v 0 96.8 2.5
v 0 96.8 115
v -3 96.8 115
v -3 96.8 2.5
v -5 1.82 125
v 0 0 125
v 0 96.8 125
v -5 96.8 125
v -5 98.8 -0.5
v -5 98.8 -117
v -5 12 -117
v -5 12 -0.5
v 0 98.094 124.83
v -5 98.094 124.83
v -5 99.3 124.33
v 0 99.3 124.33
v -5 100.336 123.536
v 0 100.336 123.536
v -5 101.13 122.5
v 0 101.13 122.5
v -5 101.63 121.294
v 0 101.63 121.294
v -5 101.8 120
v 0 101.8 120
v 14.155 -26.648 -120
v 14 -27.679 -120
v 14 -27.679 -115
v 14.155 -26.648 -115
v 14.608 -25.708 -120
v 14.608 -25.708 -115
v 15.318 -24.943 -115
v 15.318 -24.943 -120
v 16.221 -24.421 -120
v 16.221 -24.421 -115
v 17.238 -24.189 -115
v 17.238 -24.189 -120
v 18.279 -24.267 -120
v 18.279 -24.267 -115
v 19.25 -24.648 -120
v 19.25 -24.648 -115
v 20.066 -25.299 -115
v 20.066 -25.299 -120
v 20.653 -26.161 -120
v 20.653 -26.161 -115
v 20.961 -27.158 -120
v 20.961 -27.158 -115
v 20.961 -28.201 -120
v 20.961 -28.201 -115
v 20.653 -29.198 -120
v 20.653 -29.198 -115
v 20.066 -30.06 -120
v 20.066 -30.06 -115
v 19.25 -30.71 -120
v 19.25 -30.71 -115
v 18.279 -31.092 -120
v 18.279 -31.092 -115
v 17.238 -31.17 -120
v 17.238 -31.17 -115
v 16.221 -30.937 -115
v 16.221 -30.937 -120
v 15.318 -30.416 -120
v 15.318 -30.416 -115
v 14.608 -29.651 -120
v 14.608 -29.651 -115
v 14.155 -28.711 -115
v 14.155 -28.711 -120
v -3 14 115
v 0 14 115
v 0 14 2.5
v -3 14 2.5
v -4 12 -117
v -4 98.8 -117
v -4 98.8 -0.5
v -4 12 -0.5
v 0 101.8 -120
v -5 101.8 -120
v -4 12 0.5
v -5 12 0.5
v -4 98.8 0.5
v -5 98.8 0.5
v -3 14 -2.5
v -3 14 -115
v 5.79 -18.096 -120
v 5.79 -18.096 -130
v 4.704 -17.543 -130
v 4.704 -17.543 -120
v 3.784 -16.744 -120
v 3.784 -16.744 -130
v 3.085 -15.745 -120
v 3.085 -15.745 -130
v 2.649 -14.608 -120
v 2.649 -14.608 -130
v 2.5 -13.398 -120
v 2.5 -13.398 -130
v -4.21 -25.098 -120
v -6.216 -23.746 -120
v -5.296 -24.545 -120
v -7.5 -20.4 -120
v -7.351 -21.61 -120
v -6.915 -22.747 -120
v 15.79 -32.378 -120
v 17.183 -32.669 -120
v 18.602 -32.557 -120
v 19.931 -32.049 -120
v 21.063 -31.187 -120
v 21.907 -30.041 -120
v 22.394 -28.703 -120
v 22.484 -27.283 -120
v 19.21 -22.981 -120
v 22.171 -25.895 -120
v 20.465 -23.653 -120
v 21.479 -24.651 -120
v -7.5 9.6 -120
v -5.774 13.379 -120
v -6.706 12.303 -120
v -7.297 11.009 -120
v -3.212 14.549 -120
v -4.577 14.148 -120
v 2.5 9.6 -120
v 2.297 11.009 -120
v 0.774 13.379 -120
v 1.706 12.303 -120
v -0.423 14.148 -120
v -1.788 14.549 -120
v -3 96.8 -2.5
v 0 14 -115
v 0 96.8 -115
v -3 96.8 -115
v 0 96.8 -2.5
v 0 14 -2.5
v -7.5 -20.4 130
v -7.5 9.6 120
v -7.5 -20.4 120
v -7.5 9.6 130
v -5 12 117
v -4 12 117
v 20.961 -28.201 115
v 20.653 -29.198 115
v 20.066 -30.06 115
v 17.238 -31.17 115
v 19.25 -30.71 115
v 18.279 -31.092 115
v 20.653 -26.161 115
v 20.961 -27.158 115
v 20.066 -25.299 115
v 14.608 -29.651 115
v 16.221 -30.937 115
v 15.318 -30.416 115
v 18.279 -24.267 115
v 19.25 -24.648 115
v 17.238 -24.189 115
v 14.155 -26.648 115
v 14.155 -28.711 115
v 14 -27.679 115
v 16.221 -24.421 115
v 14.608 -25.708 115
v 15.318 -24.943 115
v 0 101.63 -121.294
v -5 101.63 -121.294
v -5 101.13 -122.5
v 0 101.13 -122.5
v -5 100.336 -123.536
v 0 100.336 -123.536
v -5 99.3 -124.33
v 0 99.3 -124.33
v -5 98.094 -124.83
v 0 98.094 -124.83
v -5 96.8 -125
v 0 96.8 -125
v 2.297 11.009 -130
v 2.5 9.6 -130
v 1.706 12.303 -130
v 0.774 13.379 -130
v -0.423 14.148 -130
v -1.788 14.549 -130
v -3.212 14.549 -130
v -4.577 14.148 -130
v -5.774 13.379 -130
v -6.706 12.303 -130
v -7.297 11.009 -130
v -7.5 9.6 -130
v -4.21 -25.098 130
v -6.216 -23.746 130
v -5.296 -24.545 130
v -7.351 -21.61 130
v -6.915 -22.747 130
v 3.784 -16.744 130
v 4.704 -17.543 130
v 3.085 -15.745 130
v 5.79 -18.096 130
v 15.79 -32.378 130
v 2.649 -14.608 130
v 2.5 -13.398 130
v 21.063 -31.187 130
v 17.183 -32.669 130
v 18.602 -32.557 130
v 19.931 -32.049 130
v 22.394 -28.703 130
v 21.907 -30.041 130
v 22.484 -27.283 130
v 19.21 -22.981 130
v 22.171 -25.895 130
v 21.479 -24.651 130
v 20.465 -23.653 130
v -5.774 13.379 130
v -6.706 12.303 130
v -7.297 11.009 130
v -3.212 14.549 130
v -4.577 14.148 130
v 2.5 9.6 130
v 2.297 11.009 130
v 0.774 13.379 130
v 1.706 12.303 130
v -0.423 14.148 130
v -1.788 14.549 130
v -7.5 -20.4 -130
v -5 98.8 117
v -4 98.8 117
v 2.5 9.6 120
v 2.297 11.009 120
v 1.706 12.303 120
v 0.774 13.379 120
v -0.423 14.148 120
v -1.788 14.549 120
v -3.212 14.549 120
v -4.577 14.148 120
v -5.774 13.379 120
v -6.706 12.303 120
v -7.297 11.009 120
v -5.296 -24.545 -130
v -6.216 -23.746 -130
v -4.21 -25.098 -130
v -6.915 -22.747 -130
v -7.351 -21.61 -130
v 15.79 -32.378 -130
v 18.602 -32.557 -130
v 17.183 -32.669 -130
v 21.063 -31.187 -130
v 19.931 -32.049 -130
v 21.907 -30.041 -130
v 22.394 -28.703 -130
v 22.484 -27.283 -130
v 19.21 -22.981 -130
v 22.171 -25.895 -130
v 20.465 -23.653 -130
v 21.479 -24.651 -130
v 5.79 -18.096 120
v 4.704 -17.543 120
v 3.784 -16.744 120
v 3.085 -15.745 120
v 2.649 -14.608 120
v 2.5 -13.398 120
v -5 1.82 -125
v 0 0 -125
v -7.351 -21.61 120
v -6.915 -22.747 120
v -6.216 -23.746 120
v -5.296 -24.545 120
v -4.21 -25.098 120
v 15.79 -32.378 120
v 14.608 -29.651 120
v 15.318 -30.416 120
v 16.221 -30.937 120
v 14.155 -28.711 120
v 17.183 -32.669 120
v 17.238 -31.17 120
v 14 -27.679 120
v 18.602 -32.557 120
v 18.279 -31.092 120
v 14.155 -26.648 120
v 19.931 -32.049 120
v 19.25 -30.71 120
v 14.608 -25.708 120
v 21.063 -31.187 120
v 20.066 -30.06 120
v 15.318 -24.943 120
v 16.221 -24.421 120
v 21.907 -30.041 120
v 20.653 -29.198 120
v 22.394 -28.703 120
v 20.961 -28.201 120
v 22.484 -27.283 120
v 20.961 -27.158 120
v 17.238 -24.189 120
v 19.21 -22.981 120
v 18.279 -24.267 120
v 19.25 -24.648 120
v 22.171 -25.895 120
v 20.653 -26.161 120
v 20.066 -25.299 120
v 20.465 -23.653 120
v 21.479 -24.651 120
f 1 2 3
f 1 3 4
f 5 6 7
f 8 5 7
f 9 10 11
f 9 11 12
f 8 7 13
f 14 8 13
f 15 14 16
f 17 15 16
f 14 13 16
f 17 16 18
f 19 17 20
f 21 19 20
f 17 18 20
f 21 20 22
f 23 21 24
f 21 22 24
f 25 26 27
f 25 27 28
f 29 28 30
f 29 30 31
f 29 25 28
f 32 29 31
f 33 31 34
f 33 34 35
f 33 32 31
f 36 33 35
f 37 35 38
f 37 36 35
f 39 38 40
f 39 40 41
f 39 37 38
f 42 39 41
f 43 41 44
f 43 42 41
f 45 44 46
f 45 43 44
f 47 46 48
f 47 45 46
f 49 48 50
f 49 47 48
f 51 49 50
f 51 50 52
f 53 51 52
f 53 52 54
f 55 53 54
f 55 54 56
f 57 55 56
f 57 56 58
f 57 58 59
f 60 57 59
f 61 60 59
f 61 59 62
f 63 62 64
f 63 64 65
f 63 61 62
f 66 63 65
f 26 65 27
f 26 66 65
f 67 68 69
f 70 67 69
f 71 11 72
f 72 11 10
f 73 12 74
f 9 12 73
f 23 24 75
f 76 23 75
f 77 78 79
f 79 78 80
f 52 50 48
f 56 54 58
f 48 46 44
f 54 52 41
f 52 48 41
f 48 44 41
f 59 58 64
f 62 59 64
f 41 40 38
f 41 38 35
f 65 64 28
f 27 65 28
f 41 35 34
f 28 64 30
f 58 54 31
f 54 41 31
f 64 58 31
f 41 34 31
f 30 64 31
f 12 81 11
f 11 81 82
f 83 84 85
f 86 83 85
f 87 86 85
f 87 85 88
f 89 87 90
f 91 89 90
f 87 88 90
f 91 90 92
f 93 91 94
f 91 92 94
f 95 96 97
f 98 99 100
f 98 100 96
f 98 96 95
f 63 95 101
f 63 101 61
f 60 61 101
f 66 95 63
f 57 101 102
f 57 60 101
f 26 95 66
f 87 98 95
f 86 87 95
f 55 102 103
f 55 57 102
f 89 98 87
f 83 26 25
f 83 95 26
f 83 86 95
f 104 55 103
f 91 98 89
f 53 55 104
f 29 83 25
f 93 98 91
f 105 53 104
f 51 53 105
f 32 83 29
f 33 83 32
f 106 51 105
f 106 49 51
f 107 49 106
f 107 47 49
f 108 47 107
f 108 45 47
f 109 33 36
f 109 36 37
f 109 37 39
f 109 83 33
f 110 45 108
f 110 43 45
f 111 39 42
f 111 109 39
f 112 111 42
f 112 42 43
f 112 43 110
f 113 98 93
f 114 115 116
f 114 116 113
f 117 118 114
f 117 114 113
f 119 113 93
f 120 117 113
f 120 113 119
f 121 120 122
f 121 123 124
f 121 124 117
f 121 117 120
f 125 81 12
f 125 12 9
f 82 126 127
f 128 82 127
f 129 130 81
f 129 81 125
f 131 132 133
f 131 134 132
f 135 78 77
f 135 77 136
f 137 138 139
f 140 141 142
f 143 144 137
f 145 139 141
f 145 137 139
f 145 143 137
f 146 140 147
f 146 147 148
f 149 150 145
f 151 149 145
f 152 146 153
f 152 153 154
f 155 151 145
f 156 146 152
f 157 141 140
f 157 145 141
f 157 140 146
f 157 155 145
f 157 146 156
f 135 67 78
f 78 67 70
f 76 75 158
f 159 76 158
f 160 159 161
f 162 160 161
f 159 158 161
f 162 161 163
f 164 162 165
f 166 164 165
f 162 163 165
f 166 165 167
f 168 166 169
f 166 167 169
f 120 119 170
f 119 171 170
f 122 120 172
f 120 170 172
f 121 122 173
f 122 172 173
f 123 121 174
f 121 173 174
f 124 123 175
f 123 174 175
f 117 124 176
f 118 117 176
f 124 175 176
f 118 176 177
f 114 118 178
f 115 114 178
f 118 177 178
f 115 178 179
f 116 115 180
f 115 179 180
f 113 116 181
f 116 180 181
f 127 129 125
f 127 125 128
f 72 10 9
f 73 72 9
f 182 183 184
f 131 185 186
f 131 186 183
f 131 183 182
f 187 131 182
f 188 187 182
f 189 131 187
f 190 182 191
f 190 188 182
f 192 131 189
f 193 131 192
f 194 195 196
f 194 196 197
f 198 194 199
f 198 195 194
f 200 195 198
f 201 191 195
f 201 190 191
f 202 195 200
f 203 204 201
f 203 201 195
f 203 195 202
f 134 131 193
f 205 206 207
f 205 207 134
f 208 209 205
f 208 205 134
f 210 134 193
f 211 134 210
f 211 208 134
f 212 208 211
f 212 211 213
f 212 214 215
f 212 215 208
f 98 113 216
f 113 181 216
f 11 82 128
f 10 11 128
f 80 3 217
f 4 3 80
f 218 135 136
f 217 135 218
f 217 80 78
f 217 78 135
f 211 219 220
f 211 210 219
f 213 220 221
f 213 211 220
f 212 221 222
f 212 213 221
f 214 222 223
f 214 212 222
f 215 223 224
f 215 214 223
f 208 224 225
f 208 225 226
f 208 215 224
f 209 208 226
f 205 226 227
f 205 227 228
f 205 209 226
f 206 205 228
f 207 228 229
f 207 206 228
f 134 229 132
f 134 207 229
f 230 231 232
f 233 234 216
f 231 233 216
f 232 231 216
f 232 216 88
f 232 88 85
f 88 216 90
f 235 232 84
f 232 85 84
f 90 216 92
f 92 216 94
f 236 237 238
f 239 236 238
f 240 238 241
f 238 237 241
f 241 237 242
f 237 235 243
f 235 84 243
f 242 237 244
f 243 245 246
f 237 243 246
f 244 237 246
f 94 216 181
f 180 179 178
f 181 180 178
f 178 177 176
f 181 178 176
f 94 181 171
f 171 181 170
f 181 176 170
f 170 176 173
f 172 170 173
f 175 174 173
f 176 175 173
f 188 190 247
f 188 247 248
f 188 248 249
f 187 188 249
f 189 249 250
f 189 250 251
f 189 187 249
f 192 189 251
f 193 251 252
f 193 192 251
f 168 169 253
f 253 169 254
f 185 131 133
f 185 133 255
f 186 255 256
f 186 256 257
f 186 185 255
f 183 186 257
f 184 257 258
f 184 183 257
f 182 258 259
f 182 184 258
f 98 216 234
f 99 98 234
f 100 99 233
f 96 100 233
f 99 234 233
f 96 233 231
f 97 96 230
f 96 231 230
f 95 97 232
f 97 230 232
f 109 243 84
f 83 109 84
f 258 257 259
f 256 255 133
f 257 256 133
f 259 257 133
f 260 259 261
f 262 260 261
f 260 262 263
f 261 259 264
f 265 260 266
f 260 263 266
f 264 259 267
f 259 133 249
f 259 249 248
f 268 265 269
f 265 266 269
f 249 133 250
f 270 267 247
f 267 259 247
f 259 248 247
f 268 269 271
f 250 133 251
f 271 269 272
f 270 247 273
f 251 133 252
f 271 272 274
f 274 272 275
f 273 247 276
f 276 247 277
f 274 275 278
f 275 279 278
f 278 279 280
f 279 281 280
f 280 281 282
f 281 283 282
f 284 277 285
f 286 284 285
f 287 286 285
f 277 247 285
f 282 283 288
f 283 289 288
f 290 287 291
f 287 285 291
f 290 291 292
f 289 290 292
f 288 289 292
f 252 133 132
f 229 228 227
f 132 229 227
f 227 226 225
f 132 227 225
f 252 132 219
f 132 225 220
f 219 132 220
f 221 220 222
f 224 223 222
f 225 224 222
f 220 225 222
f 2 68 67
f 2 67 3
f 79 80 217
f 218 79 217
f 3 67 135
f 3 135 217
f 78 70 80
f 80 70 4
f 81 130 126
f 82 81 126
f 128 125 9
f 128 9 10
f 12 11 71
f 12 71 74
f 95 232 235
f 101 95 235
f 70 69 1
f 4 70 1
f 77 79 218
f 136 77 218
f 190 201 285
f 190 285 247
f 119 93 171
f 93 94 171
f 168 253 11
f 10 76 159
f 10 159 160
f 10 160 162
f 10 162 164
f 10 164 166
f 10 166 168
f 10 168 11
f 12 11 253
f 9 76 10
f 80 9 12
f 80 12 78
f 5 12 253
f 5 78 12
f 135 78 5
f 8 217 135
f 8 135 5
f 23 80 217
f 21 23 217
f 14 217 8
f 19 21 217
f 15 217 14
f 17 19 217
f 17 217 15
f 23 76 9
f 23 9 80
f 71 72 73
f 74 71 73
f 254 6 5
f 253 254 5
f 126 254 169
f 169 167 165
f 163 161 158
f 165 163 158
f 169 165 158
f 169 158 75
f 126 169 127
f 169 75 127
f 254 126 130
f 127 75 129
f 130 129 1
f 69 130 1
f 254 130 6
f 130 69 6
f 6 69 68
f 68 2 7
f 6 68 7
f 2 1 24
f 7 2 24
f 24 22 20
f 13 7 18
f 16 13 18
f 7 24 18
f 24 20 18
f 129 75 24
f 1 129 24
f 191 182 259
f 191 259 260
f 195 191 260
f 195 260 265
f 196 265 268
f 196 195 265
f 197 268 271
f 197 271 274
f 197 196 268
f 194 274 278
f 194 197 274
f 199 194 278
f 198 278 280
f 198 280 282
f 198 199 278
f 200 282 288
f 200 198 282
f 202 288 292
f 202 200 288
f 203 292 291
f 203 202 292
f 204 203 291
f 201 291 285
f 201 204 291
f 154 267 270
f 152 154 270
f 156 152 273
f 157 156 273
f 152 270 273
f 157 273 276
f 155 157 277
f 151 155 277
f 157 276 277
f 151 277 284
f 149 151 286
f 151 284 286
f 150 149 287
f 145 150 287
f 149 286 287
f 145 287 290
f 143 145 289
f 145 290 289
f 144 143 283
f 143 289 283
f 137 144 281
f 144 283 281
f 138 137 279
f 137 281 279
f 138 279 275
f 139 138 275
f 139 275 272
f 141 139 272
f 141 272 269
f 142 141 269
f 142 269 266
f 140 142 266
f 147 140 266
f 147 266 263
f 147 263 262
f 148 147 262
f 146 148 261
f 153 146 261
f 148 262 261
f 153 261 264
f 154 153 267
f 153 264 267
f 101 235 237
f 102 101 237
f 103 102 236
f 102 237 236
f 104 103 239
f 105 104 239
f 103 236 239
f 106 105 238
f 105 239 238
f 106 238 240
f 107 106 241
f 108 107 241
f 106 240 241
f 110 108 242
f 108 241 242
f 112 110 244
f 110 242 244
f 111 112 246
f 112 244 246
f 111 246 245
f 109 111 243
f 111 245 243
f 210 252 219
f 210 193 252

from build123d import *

# Parameters (mm, degrees)
SKETCH1_W             = 112.5
SKETCH1_H             = 82.8
BOSS_EXTRUDE1_DEPTH   = 5
CUT_EXTRUDE1_DEPTH    = 270.978221344
BOSS_EXTRUDE2_DEPTH   = 5
SKETCH4_R             = 3.5
BOSS_EXTRUDE3_DEPTH   = 5
CHAMFER3_SIZE         = 2
SKETCH6_W             = 116.5
SKETCH6_H             = 86.8
BOSS_EXTRUDE4_DEPTH   = 1
BOSS_EXTRUDE4_2_DEPTH = 1


with BuildPart() as part:
    # Sketch1 → Boss-Extrude1 (new body)
    with BuildSketch(Plane(origin=(0, 0, 0), x_dir=(0, 0, -1), z_dir=(1, 0, 0))):
        with BuildLine():
            Line((-120, 101.8), (120, 101.8))
            ThreePointArc((120, 101.8), (123.535533906, 100.335533906), (125, 96.8))
            Line((125, 96.8), (125, 0))
            Line((125, 0), (-125, 0))
            Line((-125, 0), (-125, 96.8))
            ThreePointArc((-125, 96.8), (-123.535533906, 100.335533906), (-120, 101.8))
        make_face()
        with Locations((58.75, 55.4)):
            Rectangle(SKETCH1_W, SKETCH1_H, mode=Mode.SUBTRACT)
        with Locations((-58.75, 55.4)):
            Rectangle(SKETCH1_W, SKETCH1_H, mode=Mode.SUBTRACT)
    extrude(amount=-BOSS_EXTRUDE1_DEPTH)

    # Sketch2 → Cut-Extrude1 (cut, through all)
    with BuildSketch(Plane.XY.offset(125)):
        Polygon((-5, 0), (0, 0), (-5, 1.819851171), align=None)
    extrude(amount=-CUT_EXTRUDE1_DEPTH, mode=Mode.SUBTRACT)

    # Chamfer3
    chamfer3_edges = [part.edges().sort_by_distance(p)[0] for p in [
        (-5, 55.4, 115),
        (-5, 96.8, 58.75),
        (-5, 55.4, 2.5),
        (-5, 14, 58.75),
        (-5, 55.4, -115),
        (-5, 14, -58.75),
        (-5, 55.4, -2.5),
        (-5, 96.8, -58.75),
    ]]
    chamfer(chamfer3_edges, length=CHAMFER3_SIZE)


with BuildPart() as body_2:
    # Sketch3 → Boss-Extrude2 (new, symmetric)
    with BuildSketch(Plane.XY.offset(125)):
        with BuildLine():
            Line((-7.5, 9.6), (-7.5, -20.4))
            ThreePointArc((-7.5, -20.4), (-6.595760221, -23.267882182), (-4.210100717, -25.098463104))
            Line((-4.210100717, -25.098463104), (15.789899283, -32.377867789))
            ThreePointArc((15.789899283, -32.377867789), (22.198463104, -29.389505402), (19.210100717, -22.980941581))
            Line((19.210100717, -22.980941581), (5.789899283, -18.096387722))
            ThreePointArc((5.789899283, -18.096387722), (3.404239779, -16.2658068), (2.5, -13.397924618))
            Line((2.5, -13.397924618), (2.5, 9.6))
            ThreePointArc((2.5, 9.6), (-2.5, 14.6), (-7.5, 9.6))
        make_face()
    extrude(amount=BOSS_EXTRUDE2_DEPTH, both=True)

    # Sketch4 → Boss-Extrude3 (add)
    with BuildSketch(Plane(origin=(0, 0, 120), x_dir=(-1, 0, 0), z_dir=(0, 0, -1))):
        with Locations((-17.5, -27.679404685)):
            Circle(SKETCH4_R)
    extrude(amount=BOSS_EXTRUDE3_DEPTH)


with BuildPart() as body_3:
    # Mirror1: mirrored copy
    add(body_2.part.mirror(Plane.XY))


with BuildPart() as body_4:
    # Sketch6 → Boss-Extrude4 (new body)
    with BuildSketch(Plane.ZY.offset(5)):
        with Locations((58.75, 55.4)):
            Rectangle(SKETCH6_W, SKETCH6_H)
    extrude(amount=-BOSS_EXTRUDE4_DEPTH)


with BuildPart() as body_5:
    # Sketch6 → Boss-Extrude4 2 (new body)
    with BuildSketch(Plane.ZY.offset(5)):
        with Locations((-58.75, 55.4)):
            Rectangle(SKETCH6_W, SKETCH6_H)
    extrude(amount=-BOSS_EXTRUDE4_2_DEPTH)


solid = Compound([part.part, body_2.part, body_3.part, body_4.part, body_5.part])
